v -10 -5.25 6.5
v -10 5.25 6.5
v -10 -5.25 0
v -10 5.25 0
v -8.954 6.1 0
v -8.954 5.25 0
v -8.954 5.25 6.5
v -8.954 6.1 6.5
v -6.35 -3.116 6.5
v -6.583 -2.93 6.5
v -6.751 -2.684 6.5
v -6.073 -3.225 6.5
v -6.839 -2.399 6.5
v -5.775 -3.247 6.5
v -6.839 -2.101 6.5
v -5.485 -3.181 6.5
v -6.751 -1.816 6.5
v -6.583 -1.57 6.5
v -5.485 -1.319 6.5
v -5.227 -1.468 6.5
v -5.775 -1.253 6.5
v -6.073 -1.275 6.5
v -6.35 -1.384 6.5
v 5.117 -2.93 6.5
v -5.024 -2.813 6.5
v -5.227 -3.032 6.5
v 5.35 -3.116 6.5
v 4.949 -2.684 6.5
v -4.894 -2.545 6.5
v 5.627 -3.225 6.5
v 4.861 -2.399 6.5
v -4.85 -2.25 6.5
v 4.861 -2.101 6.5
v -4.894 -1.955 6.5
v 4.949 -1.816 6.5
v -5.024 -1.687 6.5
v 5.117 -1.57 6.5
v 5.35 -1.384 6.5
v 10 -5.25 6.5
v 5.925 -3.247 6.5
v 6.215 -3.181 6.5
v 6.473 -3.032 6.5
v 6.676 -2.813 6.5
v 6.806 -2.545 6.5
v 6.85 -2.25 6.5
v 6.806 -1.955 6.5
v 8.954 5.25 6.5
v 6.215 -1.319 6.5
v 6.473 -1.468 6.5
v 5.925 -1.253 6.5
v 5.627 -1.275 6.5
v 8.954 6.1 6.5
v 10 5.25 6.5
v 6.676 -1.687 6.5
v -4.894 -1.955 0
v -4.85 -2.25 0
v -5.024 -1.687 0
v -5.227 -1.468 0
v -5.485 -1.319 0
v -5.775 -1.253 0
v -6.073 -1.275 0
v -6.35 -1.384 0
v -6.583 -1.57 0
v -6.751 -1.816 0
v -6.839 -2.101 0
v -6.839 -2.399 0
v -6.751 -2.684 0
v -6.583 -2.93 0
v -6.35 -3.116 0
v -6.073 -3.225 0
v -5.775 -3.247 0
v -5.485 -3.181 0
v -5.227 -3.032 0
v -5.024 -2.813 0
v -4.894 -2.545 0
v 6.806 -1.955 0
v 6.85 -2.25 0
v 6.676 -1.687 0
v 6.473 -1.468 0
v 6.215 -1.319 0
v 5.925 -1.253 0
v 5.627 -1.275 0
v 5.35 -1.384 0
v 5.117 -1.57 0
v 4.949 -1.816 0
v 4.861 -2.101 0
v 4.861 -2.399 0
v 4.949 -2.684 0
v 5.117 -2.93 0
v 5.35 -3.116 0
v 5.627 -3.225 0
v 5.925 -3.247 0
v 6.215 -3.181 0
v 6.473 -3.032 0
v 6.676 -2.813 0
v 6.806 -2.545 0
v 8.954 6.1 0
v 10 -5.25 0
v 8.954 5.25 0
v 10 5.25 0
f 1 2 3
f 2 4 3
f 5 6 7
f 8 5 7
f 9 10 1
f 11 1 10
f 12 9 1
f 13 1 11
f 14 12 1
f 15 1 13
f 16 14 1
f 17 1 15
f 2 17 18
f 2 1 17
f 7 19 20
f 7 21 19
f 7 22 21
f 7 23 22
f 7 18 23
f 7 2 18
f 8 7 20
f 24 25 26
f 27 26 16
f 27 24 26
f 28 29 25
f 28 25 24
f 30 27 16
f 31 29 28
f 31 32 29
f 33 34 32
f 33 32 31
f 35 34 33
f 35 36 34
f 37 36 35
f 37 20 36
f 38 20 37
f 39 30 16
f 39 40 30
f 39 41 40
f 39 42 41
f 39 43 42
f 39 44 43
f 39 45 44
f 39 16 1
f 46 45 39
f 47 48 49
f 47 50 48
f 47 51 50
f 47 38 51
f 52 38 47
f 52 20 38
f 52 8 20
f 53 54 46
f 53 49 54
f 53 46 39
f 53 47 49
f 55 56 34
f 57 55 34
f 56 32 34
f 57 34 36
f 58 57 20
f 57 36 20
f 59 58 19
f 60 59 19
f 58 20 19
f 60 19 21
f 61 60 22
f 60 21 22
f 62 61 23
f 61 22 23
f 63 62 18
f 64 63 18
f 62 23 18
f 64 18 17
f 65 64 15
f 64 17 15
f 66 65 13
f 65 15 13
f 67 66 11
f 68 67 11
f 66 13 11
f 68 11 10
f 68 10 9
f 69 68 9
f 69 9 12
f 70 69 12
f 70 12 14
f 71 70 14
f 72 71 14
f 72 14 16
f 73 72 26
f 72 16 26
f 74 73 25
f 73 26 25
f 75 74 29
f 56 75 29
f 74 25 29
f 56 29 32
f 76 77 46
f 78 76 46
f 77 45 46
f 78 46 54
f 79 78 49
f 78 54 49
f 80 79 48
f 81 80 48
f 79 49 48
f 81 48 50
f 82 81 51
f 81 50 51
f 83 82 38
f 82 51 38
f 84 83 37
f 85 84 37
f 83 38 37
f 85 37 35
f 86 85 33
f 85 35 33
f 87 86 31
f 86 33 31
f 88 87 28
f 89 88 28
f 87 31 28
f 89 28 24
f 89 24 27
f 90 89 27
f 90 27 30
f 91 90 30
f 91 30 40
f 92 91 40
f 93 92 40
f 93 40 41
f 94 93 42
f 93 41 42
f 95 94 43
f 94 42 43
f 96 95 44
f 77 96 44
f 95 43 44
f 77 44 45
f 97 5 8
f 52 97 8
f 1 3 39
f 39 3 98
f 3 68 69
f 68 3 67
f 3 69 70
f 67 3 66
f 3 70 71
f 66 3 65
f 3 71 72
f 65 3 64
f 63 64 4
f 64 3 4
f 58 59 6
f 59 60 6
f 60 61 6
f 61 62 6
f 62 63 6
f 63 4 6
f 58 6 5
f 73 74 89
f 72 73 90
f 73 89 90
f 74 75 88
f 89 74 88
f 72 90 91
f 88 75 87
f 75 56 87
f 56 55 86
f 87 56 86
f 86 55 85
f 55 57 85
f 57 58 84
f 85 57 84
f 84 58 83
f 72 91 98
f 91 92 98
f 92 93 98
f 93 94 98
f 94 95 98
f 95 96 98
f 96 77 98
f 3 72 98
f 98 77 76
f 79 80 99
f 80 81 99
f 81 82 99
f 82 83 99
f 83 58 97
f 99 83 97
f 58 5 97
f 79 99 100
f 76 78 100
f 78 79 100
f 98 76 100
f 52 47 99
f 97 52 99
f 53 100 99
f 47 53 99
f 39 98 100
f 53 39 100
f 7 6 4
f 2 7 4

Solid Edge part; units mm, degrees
sketch "Sketch1" plane through (0, 0, 0) normal (0, 0, 1) x (1, 0, 0)
  line L0 (-10, -5.25) -> (10, -5.25)
  line L1 (10, -5.25) -> (10, 5.25)
  line L2 (10, 5.25) -> (-10, 5.25)
  line L3 (-10, 5.25) -> (-10, -5.25)
  dimension "D1" = 20
  dimension "D2" = 10
  dimension "D3" = 5.25
  dimension "D4" = 5.25
extrude "Protrusion1" add sketch "Sketch1" along normal blind 6.5
sketch "Sketch2" plane through (0, 0, 6.5) normal (0, 0, 1) x (1, 0, 0)
  circle A0 centre (5.85, -2.25) radius 1
  circle A1 centre (-5.85, -2.25) radius 1
  dimension "D1" = 3
  dimension "D2" = 3
  dimension "D3" = 5.85
  dimension "D4" = 5.85
extrude "ExtrudedCutout_1" cut sketch "Sketch2" against normal blind 40.1808
sketch "Sketch3" plane through (0, 5.25, 3.25) normal (0, 1, 0) x (1, 0, 0)
  line L0 (-8.9539, 3.25) -> (-8.9539, -3.25)
  line L1 (-8.9539, -3.25) -> (8.9539, -3.25)
  line L2 (8.9539, -3.25) -> (8.9539, 3.25)
  line L3 (8.9539, 3.25) -> (-8.9539, 3.25)
extrude "ExtrudedProtrusion_2" add sketch "Sketch3" along normal blind 0.85
